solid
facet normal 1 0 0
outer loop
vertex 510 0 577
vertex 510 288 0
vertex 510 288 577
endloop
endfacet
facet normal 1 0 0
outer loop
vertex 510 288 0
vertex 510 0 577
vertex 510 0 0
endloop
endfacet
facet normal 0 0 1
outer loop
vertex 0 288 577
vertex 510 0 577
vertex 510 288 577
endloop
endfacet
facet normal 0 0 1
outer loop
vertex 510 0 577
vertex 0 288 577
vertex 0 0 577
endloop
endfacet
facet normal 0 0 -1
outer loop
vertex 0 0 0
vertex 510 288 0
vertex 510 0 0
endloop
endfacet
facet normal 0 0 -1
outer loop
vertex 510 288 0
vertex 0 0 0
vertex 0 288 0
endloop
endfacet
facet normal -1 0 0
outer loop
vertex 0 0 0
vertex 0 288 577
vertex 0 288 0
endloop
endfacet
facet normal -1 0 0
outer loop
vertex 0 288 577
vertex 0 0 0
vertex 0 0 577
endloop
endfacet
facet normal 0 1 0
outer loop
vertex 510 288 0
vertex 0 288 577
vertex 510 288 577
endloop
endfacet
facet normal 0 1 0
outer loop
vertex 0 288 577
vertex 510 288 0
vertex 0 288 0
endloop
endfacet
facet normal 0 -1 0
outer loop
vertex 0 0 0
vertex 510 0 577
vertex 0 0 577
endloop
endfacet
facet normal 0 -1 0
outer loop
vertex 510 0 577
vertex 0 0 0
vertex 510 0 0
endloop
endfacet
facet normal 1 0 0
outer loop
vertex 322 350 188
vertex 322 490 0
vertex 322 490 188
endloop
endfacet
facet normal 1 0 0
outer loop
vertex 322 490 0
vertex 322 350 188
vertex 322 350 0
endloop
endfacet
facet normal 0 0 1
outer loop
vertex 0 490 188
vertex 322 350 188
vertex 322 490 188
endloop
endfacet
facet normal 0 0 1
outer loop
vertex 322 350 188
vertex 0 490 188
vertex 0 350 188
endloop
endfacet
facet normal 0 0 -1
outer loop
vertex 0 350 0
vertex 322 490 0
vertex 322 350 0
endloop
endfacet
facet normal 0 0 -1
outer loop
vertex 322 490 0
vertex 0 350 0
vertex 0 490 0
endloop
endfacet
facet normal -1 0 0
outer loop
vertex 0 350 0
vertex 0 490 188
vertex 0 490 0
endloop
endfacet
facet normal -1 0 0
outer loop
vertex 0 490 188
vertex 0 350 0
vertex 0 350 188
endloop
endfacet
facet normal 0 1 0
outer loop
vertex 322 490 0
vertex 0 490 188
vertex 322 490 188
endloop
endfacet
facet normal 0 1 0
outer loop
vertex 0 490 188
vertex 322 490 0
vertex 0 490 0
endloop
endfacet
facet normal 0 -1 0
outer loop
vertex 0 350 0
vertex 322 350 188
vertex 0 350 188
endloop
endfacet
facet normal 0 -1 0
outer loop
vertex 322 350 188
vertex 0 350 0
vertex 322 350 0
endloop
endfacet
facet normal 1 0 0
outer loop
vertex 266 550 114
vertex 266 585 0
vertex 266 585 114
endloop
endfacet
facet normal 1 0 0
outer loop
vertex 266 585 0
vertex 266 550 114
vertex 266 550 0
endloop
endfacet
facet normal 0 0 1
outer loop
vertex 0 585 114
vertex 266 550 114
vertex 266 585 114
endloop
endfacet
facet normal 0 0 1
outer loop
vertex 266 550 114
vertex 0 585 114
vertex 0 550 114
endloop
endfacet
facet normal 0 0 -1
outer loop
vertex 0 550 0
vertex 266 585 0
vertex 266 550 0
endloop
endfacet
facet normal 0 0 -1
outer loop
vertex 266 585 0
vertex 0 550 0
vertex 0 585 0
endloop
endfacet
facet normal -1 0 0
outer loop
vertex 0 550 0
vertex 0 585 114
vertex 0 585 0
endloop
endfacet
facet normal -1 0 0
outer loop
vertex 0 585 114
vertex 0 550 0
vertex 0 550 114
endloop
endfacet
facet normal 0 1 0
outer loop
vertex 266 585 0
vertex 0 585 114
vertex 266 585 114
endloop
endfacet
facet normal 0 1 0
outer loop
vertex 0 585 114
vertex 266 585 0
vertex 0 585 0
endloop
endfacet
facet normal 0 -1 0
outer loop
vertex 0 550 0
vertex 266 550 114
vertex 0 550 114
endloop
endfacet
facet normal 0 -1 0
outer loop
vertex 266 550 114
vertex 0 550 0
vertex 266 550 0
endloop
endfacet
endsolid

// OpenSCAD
cube([510, 288, 577], false);

translate([0, 350, 0]) cube([322, 140, 188], false);

translate([0, 550, 0]) cube([266, 35, 114]);


translate([460, 288, 250]) 
color([0.3,0,0])
rotate([90, 0, 180]) 
text("Antec 902", 70);

translate([270, 490, 120]) 
color([0.3,0,0])
rotate([90, 0, 180]) 
text("Ghost S1", 40);


translate([240, 585, 40]) 
color([0.3,0,0])
rotate([90, 0, 180]) 
text("GTX 970", 40);
